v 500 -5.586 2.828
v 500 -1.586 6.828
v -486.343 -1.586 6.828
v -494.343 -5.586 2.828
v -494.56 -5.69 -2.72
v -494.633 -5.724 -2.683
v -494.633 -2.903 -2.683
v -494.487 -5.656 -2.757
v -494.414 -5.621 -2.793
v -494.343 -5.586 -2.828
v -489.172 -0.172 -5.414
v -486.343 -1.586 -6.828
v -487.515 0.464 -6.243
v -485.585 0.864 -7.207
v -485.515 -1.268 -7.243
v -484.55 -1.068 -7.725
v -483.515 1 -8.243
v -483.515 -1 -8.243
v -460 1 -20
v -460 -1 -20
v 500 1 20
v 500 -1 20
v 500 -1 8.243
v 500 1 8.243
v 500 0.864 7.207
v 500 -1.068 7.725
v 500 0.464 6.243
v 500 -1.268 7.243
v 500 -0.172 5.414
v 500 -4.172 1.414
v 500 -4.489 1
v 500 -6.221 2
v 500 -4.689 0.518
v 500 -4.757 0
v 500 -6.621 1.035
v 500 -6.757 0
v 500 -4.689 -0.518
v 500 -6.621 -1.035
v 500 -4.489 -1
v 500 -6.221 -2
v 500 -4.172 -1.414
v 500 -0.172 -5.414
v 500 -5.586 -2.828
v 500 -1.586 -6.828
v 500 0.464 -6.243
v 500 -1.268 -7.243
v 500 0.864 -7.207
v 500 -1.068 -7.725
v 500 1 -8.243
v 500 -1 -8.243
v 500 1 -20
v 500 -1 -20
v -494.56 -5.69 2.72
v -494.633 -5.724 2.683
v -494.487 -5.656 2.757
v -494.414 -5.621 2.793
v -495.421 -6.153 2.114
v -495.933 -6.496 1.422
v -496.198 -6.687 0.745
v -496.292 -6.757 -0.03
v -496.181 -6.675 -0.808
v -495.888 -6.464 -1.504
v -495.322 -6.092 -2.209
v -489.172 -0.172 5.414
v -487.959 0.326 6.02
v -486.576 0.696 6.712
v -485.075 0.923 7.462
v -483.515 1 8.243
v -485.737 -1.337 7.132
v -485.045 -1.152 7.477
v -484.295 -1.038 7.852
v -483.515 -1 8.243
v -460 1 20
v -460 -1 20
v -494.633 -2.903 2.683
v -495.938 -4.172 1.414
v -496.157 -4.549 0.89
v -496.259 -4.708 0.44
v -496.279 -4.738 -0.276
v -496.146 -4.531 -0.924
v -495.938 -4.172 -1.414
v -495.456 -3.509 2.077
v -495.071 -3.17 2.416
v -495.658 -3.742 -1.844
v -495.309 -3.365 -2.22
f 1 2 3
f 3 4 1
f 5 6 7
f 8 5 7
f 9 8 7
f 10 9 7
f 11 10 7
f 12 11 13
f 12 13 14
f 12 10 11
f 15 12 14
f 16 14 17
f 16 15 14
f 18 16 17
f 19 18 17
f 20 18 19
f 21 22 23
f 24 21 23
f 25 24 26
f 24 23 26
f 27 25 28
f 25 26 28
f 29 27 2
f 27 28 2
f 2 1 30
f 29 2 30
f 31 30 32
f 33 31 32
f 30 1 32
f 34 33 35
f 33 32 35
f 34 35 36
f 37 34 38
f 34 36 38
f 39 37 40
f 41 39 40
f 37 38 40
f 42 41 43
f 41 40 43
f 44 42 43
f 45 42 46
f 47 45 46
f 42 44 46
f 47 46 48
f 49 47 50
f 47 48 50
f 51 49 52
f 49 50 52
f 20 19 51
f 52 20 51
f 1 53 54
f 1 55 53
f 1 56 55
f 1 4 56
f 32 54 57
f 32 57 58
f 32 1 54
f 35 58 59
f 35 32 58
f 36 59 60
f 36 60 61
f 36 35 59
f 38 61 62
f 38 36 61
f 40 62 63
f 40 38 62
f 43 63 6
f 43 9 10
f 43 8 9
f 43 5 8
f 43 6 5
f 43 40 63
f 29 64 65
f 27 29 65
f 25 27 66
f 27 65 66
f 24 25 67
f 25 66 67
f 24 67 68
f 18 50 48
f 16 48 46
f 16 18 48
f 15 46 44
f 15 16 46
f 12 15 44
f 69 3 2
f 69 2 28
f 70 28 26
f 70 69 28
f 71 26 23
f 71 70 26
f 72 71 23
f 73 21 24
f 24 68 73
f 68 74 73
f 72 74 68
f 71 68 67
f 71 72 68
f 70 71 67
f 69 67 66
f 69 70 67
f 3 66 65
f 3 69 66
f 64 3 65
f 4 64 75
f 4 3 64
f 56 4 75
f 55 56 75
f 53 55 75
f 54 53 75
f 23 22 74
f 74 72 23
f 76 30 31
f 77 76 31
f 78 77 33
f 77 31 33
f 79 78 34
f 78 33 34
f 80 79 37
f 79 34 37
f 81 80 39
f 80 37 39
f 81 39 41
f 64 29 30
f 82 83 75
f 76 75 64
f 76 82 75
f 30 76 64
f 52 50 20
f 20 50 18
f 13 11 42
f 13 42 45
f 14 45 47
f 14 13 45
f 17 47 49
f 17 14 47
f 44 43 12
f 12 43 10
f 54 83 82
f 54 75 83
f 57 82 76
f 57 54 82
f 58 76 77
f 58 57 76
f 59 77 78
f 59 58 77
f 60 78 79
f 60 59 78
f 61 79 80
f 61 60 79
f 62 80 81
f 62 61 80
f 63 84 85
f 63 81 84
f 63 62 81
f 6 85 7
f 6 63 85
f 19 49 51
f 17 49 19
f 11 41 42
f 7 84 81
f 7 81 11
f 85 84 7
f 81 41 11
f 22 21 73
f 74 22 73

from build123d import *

# Parameters (mm, degrees)
SHEET_EXTRUDE_1_1_BACK   = 500
SHEET_EXTRUDE_1_1_DEPTH  = 1000
THICKEN_1_T1             = 1
THICKEN_1_T2             = 1
FILLET_1_R               = 2
FILLET_2_R               = 4
CUT_EXTRUDE_1_DEPTH      = 501.445463467
CUT_EXTRUDE_1_DEPTH_BACK = 501.445463467


with BuildPart() as body_1:
    # Sheet Extrude 1: a surface, the sketch's curves swept straight by 1000 mm
    with BuildLine(Plane(origin=(0, 0, 0), x_dir=(0, 0, -1), z_dir=(1, 0, 0)).offset(-SHEET_EXTRUDE_1_1_BACK), mode=Mode.PRIVATE) as sheet_extrude_1_1_path:
        Line((-20, 0), (-7, 0))
        Line((-7, 0), (0, -7))
        Line((0, -7), (7, 0))
        Line((7, 0), (20, 0))
    sheet_extrude_1_1 = Shell.extrude(sheet_extrude_1_1_path.wire(), (1 * SHEET_EXTRUDE_1_1_DEPTH, 0 * SHEET_EXTRUDE_1_1_DEPTH, 0 * SHEET_EXTRUDE_1_1_DEPTH))
    add(Solid.thicken(sheet_extrude_1_1, THICKEN_1_T1))
    add(Solid.thicken(sheet_extrude_1_1, -THICKEN_1_T2))

    # Скругление1
    fillet_1_edges = [body_1.edges().sort_by_distance(p)[0] for p in [
        (0, -5.585786438, 0),
        (0, -1, -7.414213562),
        (0, -1, 7.414213562),
    ]]
    fillet(fillet_1_edges, radius=FILLET_1_R)

    # Скругление2
    fillet_2_edges = [body_1.edges().sort_by_distance(p)[0] for p in [
        (0, 1, 6.585786438),
        (0, 1, -6.585786438),
        (0, -8.414213562, 0),
    ]]
    fillet(fillet_2_edges, radius=FILLET_2_R)

    # Эскиз2 → Вырез-Вытянуть1 (cut, two sides: drawn at the far end of the back side and taken through both)
    with BuildSketch(Plane(origin=(0, 0, 0), x_dir=(1, 0, 0), z_dir=(0, 1, 0)).offset(-CUT_EXTRUDE_1_DEPTH_BACK)):
        with BuildLine():
            Line((1267.734544165, -883.867272083), (-460, -20))
            Line((-460, -20), (-494.633436854, -2.683281573))
            ThreePointArc((-494.633436854, -2.683281573), (-496.291796068, 0), (-494.633436854, 2.683281573))
            Line((-494.633436854, 2.683281573), (-460, 20))
            Line((-460, 20), (1267.734544165, 883.867272083))
            Line((1267.734544165, 883.867272083), (-2595.597343663, 883.867272083))
            Line((-2595.597343663, 883.867272083), (-2595.597343663, -883.867272083))
            Line((-2595.597343663, -883.867272083), (1267.734544165, -883.867272083))
        make_face()
    extrude(amount=CUT_EXTRUDE_1_DEPTH + CUT_EXTRUDE_1_DEPTH_BACK, mode=Mode.SUBTRACT)


solid = body_1.part
